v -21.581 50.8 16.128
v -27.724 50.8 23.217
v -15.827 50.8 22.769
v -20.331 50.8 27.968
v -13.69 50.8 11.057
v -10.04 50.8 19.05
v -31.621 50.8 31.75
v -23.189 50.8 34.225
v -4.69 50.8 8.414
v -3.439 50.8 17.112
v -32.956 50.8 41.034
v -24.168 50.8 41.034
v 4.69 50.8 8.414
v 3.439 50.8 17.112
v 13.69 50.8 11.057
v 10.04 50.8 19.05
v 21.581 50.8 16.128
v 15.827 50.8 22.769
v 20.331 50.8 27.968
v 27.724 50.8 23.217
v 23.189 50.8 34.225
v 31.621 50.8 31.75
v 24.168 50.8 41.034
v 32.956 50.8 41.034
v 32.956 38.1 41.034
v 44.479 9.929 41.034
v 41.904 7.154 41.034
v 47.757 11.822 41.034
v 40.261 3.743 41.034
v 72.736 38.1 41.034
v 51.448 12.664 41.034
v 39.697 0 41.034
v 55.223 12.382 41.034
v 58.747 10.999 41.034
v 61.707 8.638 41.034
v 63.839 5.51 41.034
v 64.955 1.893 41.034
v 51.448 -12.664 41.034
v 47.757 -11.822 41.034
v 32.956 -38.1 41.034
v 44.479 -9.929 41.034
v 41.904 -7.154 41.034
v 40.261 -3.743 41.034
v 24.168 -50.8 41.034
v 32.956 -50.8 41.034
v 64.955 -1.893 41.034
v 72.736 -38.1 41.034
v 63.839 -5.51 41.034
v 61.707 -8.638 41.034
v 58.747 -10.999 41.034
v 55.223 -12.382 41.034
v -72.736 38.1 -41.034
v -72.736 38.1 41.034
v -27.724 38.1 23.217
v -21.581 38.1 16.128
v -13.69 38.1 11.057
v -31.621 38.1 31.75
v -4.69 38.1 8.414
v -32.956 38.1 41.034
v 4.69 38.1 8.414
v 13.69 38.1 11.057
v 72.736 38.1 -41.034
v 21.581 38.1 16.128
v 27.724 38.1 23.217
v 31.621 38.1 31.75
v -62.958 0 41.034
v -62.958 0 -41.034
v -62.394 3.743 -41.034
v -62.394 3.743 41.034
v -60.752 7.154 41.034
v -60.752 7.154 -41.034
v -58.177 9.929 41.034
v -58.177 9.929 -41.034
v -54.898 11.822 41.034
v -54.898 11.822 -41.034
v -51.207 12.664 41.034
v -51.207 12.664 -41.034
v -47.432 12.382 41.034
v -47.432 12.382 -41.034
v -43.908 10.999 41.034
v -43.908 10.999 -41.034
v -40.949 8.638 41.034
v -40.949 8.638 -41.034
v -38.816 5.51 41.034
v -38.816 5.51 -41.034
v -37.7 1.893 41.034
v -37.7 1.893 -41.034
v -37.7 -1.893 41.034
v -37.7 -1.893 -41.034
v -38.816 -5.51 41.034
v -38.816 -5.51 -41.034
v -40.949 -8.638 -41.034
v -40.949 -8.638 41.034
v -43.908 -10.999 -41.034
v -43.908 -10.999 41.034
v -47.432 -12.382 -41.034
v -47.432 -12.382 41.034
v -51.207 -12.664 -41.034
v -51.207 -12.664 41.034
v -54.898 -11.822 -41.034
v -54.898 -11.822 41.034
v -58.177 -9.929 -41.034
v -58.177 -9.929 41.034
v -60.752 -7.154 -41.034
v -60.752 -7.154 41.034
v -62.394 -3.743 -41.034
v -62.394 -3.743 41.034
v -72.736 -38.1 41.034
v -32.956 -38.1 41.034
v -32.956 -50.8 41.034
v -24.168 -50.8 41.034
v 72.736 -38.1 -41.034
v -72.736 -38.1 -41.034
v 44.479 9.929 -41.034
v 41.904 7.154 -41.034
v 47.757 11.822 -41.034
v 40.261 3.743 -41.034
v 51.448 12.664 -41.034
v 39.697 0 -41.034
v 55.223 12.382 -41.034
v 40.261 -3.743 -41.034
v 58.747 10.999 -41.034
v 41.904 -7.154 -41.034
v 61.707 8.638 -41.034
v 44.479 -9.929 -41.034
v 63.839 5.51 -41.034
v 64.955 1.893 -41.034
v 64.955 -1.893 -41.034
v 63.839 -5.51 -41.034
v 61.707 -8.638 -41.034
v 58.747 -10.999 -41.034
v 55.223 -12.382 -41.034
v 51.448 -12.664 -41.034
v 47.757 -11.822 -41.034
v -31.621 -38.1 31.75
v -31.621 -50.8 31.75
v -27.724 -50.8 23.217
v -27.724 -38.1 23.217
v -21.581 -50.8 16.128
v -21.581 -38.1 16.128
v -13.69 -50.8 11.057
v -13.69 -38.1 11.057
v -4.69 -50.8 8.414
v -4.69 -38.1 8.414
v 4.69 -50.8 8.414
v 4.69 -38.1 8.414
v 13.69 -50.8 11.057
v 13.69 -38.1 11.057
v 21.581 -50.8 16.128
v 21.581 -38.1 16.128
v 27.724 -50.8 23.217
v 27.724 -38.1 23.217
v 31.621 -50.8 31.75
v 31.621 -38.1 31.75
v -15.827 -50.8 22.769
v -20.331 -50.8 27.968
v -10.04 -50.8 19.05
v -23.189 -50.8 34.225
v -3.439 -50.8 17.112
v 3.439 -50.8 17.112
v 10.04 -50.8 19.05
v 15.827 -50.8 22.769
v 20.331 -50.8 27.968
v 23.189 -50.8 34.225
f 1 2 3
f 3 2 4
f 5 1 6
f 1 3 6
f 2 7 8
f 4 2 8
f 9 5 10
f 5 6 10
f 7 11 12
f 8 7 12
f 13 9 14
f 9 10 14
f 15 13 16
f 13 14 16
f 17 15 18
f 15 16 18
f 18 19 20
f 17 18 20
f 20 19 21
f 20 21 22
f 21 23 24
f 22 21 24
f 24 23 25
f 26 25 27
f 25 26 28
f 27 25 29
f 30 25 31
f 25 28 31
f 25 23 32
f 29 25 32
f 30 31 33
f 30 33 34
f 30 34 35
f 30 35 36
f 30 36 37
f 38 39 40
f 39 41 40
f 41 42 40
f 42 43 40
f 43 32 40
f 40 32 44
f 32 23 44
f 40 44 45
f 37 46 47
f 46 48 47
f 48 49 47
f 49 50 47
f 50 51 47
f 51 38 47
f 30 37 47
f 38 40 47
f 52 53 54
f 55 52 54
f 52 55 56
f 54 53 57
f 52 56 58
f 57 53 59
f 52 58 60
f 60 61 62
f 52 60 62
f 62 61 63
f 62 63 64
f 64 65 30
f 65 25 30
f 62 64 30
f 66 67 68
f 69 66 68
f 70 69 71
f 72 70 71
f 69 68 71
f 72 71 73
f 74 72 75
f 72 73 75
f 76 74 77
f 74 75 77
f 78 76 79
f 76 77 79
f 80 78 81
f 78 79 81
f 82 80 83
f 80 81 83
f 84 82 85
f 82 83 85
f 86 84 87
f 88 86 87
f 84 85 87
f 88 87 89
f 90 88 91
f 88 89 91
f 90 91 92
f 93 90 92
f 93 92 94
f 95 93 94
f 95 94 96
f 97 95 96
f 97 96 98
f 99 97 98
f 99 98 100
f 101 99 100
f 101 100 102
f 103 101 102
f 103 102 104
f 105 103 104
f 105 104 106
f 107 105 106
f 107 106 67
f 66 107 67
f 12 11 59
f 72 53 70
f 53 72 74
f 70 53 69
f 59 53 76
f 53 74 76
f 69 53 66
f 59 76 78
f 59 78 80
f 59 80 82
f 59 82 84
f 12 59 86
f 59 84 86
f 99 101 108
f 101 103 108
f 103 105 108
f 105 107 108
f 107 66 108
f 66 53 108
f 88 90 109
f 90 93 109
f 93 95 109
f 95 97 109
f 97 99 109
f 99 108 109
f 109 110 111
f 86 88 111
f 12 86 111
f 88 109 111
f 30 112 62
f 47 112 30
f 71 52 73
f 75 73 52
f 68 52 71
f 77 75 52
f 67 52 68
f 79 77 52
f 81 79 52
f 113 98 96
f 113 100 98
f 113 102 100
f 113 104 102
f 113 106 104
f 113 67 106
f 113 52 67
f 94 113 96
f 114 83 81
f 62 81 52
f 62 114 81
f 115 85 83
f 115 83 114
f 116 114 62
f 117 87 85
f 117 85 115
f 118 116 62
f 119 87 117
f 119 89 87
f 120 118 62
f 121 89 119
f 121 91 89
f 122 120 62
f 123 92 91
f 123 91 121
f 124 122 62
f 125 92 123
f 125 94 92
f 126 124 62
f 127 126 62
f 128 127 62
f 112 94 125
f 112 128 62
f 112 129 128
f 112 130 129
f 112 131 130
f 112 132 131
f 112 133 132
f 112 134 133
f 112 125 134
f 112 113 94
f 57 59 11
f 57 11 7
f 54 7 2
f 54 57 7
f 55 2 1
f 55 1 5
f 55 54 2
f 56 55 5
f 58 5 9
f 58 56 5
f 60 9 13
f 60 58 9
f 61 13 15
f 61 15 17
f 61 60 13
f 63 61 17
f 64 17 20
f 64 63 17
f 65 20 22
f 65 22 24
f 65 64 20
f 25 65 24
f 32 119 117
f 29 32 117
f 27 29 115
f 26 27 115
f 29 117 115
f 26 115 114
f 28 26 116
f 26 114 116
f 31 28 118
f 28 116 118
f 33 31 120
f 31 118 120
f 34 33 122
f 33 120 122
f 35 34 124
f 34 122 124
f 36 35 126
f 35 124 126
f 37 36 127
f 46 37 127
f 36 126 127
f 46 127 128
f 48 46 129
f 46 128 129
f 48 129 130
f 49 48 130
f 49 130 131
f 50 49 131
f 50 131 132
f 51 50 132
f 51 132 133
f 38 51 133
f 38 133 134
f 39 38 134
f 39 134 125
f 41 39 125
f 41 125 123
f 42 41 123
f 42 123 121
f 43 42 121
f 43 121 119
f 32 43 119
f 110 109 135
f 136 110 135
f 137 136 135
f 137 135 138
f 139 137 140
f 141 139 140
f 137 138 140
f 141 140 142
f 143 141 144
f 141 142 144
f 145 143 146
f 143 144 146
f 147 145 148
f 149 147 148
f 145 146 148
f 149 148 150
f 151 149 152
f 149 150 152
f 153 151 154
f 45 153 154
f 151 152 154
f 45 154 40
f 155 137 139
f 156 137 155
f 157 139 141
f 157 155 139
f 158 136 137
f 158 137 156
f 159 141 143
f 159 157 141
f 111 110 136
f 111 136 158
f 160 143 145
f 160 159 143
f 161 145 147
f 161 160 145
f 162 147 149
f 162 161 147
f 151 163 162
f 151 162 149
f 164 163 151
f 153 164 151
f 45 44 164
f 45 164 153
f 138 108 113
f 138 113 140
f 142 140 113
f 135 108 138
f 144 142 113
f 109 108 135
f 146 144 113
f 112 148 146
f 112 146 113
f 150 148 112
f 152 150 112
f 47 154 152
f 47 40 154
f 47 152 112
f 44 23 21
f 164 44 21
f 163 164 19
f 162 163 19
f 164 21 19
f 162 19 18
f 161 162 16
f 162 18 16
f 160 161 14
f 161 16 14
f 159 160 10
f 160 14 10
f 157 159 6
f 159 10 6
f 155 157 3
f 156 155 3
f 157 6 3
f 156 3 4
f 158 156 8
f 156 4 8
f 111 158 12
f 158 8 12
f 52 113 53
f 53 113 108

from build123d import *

# Parameters (mm, degrees)
F0_W          = 145.4727351665
F0_H          = 82.0685699582
F1_DEPTH      = 38.1
F3_DEPTH      = 12.7
F3_DEPTH_BACK = 88.9
F4_DEPTH      = 88.901
F6_D          = 25.4


with BuildPart() as f1:
    # F0 (on Front) → F1 (new body, symmetric)
    with BuildSketch(Plane.XZ):
        Rectangle(F0_W, F0_H)
    extrude(amount=F1_DEPTH, both=True)

    # F2 (on face) → F3 (join, two sides)
    with BuildSketch(Plane.XZ.offset(38.1)) as f3_sk:
        with BuildLine():
            Line((-24.1679944094, 41.0342849791), (-32.9555145721, 41.0342849791))
            ThreePointArc((-32.9555145721, 41.0342849791), (0, 8.078770407), (32.9555145721, 41.0342849791))
            Line((32.9555145721, 41.0342849791), (24.1679944094, 41.0342849791))
            ThreePointArc((24.1679944094, 41.0342849791), (0, 16.8662905697), (-24.1679944094, 41.0342849791))
        make_face()
    extrude(amount=F3_DEPTH)
    extrude(f3_sk.sketch, amount=-F3_DEPTH_BACK)

    # F4 (cut, through all): a face of the model
    f4_faces = [f1.faces().sort_by_distance(p)[0] for p in [
        (0, -38.1, 30.7770695794),
    ]]
    extrude(f4_faces, amount=-F4_DEPTH, mode=Mode.SUBTRACT)

    # F6 (through all)
    with Locations(Plane.XY.offset(41.0342849791)):
        with Locations((-50.2582862973, 0), (52.3969344795, 0)):
            Hole(F6_D / 2)


solid = f1.part
